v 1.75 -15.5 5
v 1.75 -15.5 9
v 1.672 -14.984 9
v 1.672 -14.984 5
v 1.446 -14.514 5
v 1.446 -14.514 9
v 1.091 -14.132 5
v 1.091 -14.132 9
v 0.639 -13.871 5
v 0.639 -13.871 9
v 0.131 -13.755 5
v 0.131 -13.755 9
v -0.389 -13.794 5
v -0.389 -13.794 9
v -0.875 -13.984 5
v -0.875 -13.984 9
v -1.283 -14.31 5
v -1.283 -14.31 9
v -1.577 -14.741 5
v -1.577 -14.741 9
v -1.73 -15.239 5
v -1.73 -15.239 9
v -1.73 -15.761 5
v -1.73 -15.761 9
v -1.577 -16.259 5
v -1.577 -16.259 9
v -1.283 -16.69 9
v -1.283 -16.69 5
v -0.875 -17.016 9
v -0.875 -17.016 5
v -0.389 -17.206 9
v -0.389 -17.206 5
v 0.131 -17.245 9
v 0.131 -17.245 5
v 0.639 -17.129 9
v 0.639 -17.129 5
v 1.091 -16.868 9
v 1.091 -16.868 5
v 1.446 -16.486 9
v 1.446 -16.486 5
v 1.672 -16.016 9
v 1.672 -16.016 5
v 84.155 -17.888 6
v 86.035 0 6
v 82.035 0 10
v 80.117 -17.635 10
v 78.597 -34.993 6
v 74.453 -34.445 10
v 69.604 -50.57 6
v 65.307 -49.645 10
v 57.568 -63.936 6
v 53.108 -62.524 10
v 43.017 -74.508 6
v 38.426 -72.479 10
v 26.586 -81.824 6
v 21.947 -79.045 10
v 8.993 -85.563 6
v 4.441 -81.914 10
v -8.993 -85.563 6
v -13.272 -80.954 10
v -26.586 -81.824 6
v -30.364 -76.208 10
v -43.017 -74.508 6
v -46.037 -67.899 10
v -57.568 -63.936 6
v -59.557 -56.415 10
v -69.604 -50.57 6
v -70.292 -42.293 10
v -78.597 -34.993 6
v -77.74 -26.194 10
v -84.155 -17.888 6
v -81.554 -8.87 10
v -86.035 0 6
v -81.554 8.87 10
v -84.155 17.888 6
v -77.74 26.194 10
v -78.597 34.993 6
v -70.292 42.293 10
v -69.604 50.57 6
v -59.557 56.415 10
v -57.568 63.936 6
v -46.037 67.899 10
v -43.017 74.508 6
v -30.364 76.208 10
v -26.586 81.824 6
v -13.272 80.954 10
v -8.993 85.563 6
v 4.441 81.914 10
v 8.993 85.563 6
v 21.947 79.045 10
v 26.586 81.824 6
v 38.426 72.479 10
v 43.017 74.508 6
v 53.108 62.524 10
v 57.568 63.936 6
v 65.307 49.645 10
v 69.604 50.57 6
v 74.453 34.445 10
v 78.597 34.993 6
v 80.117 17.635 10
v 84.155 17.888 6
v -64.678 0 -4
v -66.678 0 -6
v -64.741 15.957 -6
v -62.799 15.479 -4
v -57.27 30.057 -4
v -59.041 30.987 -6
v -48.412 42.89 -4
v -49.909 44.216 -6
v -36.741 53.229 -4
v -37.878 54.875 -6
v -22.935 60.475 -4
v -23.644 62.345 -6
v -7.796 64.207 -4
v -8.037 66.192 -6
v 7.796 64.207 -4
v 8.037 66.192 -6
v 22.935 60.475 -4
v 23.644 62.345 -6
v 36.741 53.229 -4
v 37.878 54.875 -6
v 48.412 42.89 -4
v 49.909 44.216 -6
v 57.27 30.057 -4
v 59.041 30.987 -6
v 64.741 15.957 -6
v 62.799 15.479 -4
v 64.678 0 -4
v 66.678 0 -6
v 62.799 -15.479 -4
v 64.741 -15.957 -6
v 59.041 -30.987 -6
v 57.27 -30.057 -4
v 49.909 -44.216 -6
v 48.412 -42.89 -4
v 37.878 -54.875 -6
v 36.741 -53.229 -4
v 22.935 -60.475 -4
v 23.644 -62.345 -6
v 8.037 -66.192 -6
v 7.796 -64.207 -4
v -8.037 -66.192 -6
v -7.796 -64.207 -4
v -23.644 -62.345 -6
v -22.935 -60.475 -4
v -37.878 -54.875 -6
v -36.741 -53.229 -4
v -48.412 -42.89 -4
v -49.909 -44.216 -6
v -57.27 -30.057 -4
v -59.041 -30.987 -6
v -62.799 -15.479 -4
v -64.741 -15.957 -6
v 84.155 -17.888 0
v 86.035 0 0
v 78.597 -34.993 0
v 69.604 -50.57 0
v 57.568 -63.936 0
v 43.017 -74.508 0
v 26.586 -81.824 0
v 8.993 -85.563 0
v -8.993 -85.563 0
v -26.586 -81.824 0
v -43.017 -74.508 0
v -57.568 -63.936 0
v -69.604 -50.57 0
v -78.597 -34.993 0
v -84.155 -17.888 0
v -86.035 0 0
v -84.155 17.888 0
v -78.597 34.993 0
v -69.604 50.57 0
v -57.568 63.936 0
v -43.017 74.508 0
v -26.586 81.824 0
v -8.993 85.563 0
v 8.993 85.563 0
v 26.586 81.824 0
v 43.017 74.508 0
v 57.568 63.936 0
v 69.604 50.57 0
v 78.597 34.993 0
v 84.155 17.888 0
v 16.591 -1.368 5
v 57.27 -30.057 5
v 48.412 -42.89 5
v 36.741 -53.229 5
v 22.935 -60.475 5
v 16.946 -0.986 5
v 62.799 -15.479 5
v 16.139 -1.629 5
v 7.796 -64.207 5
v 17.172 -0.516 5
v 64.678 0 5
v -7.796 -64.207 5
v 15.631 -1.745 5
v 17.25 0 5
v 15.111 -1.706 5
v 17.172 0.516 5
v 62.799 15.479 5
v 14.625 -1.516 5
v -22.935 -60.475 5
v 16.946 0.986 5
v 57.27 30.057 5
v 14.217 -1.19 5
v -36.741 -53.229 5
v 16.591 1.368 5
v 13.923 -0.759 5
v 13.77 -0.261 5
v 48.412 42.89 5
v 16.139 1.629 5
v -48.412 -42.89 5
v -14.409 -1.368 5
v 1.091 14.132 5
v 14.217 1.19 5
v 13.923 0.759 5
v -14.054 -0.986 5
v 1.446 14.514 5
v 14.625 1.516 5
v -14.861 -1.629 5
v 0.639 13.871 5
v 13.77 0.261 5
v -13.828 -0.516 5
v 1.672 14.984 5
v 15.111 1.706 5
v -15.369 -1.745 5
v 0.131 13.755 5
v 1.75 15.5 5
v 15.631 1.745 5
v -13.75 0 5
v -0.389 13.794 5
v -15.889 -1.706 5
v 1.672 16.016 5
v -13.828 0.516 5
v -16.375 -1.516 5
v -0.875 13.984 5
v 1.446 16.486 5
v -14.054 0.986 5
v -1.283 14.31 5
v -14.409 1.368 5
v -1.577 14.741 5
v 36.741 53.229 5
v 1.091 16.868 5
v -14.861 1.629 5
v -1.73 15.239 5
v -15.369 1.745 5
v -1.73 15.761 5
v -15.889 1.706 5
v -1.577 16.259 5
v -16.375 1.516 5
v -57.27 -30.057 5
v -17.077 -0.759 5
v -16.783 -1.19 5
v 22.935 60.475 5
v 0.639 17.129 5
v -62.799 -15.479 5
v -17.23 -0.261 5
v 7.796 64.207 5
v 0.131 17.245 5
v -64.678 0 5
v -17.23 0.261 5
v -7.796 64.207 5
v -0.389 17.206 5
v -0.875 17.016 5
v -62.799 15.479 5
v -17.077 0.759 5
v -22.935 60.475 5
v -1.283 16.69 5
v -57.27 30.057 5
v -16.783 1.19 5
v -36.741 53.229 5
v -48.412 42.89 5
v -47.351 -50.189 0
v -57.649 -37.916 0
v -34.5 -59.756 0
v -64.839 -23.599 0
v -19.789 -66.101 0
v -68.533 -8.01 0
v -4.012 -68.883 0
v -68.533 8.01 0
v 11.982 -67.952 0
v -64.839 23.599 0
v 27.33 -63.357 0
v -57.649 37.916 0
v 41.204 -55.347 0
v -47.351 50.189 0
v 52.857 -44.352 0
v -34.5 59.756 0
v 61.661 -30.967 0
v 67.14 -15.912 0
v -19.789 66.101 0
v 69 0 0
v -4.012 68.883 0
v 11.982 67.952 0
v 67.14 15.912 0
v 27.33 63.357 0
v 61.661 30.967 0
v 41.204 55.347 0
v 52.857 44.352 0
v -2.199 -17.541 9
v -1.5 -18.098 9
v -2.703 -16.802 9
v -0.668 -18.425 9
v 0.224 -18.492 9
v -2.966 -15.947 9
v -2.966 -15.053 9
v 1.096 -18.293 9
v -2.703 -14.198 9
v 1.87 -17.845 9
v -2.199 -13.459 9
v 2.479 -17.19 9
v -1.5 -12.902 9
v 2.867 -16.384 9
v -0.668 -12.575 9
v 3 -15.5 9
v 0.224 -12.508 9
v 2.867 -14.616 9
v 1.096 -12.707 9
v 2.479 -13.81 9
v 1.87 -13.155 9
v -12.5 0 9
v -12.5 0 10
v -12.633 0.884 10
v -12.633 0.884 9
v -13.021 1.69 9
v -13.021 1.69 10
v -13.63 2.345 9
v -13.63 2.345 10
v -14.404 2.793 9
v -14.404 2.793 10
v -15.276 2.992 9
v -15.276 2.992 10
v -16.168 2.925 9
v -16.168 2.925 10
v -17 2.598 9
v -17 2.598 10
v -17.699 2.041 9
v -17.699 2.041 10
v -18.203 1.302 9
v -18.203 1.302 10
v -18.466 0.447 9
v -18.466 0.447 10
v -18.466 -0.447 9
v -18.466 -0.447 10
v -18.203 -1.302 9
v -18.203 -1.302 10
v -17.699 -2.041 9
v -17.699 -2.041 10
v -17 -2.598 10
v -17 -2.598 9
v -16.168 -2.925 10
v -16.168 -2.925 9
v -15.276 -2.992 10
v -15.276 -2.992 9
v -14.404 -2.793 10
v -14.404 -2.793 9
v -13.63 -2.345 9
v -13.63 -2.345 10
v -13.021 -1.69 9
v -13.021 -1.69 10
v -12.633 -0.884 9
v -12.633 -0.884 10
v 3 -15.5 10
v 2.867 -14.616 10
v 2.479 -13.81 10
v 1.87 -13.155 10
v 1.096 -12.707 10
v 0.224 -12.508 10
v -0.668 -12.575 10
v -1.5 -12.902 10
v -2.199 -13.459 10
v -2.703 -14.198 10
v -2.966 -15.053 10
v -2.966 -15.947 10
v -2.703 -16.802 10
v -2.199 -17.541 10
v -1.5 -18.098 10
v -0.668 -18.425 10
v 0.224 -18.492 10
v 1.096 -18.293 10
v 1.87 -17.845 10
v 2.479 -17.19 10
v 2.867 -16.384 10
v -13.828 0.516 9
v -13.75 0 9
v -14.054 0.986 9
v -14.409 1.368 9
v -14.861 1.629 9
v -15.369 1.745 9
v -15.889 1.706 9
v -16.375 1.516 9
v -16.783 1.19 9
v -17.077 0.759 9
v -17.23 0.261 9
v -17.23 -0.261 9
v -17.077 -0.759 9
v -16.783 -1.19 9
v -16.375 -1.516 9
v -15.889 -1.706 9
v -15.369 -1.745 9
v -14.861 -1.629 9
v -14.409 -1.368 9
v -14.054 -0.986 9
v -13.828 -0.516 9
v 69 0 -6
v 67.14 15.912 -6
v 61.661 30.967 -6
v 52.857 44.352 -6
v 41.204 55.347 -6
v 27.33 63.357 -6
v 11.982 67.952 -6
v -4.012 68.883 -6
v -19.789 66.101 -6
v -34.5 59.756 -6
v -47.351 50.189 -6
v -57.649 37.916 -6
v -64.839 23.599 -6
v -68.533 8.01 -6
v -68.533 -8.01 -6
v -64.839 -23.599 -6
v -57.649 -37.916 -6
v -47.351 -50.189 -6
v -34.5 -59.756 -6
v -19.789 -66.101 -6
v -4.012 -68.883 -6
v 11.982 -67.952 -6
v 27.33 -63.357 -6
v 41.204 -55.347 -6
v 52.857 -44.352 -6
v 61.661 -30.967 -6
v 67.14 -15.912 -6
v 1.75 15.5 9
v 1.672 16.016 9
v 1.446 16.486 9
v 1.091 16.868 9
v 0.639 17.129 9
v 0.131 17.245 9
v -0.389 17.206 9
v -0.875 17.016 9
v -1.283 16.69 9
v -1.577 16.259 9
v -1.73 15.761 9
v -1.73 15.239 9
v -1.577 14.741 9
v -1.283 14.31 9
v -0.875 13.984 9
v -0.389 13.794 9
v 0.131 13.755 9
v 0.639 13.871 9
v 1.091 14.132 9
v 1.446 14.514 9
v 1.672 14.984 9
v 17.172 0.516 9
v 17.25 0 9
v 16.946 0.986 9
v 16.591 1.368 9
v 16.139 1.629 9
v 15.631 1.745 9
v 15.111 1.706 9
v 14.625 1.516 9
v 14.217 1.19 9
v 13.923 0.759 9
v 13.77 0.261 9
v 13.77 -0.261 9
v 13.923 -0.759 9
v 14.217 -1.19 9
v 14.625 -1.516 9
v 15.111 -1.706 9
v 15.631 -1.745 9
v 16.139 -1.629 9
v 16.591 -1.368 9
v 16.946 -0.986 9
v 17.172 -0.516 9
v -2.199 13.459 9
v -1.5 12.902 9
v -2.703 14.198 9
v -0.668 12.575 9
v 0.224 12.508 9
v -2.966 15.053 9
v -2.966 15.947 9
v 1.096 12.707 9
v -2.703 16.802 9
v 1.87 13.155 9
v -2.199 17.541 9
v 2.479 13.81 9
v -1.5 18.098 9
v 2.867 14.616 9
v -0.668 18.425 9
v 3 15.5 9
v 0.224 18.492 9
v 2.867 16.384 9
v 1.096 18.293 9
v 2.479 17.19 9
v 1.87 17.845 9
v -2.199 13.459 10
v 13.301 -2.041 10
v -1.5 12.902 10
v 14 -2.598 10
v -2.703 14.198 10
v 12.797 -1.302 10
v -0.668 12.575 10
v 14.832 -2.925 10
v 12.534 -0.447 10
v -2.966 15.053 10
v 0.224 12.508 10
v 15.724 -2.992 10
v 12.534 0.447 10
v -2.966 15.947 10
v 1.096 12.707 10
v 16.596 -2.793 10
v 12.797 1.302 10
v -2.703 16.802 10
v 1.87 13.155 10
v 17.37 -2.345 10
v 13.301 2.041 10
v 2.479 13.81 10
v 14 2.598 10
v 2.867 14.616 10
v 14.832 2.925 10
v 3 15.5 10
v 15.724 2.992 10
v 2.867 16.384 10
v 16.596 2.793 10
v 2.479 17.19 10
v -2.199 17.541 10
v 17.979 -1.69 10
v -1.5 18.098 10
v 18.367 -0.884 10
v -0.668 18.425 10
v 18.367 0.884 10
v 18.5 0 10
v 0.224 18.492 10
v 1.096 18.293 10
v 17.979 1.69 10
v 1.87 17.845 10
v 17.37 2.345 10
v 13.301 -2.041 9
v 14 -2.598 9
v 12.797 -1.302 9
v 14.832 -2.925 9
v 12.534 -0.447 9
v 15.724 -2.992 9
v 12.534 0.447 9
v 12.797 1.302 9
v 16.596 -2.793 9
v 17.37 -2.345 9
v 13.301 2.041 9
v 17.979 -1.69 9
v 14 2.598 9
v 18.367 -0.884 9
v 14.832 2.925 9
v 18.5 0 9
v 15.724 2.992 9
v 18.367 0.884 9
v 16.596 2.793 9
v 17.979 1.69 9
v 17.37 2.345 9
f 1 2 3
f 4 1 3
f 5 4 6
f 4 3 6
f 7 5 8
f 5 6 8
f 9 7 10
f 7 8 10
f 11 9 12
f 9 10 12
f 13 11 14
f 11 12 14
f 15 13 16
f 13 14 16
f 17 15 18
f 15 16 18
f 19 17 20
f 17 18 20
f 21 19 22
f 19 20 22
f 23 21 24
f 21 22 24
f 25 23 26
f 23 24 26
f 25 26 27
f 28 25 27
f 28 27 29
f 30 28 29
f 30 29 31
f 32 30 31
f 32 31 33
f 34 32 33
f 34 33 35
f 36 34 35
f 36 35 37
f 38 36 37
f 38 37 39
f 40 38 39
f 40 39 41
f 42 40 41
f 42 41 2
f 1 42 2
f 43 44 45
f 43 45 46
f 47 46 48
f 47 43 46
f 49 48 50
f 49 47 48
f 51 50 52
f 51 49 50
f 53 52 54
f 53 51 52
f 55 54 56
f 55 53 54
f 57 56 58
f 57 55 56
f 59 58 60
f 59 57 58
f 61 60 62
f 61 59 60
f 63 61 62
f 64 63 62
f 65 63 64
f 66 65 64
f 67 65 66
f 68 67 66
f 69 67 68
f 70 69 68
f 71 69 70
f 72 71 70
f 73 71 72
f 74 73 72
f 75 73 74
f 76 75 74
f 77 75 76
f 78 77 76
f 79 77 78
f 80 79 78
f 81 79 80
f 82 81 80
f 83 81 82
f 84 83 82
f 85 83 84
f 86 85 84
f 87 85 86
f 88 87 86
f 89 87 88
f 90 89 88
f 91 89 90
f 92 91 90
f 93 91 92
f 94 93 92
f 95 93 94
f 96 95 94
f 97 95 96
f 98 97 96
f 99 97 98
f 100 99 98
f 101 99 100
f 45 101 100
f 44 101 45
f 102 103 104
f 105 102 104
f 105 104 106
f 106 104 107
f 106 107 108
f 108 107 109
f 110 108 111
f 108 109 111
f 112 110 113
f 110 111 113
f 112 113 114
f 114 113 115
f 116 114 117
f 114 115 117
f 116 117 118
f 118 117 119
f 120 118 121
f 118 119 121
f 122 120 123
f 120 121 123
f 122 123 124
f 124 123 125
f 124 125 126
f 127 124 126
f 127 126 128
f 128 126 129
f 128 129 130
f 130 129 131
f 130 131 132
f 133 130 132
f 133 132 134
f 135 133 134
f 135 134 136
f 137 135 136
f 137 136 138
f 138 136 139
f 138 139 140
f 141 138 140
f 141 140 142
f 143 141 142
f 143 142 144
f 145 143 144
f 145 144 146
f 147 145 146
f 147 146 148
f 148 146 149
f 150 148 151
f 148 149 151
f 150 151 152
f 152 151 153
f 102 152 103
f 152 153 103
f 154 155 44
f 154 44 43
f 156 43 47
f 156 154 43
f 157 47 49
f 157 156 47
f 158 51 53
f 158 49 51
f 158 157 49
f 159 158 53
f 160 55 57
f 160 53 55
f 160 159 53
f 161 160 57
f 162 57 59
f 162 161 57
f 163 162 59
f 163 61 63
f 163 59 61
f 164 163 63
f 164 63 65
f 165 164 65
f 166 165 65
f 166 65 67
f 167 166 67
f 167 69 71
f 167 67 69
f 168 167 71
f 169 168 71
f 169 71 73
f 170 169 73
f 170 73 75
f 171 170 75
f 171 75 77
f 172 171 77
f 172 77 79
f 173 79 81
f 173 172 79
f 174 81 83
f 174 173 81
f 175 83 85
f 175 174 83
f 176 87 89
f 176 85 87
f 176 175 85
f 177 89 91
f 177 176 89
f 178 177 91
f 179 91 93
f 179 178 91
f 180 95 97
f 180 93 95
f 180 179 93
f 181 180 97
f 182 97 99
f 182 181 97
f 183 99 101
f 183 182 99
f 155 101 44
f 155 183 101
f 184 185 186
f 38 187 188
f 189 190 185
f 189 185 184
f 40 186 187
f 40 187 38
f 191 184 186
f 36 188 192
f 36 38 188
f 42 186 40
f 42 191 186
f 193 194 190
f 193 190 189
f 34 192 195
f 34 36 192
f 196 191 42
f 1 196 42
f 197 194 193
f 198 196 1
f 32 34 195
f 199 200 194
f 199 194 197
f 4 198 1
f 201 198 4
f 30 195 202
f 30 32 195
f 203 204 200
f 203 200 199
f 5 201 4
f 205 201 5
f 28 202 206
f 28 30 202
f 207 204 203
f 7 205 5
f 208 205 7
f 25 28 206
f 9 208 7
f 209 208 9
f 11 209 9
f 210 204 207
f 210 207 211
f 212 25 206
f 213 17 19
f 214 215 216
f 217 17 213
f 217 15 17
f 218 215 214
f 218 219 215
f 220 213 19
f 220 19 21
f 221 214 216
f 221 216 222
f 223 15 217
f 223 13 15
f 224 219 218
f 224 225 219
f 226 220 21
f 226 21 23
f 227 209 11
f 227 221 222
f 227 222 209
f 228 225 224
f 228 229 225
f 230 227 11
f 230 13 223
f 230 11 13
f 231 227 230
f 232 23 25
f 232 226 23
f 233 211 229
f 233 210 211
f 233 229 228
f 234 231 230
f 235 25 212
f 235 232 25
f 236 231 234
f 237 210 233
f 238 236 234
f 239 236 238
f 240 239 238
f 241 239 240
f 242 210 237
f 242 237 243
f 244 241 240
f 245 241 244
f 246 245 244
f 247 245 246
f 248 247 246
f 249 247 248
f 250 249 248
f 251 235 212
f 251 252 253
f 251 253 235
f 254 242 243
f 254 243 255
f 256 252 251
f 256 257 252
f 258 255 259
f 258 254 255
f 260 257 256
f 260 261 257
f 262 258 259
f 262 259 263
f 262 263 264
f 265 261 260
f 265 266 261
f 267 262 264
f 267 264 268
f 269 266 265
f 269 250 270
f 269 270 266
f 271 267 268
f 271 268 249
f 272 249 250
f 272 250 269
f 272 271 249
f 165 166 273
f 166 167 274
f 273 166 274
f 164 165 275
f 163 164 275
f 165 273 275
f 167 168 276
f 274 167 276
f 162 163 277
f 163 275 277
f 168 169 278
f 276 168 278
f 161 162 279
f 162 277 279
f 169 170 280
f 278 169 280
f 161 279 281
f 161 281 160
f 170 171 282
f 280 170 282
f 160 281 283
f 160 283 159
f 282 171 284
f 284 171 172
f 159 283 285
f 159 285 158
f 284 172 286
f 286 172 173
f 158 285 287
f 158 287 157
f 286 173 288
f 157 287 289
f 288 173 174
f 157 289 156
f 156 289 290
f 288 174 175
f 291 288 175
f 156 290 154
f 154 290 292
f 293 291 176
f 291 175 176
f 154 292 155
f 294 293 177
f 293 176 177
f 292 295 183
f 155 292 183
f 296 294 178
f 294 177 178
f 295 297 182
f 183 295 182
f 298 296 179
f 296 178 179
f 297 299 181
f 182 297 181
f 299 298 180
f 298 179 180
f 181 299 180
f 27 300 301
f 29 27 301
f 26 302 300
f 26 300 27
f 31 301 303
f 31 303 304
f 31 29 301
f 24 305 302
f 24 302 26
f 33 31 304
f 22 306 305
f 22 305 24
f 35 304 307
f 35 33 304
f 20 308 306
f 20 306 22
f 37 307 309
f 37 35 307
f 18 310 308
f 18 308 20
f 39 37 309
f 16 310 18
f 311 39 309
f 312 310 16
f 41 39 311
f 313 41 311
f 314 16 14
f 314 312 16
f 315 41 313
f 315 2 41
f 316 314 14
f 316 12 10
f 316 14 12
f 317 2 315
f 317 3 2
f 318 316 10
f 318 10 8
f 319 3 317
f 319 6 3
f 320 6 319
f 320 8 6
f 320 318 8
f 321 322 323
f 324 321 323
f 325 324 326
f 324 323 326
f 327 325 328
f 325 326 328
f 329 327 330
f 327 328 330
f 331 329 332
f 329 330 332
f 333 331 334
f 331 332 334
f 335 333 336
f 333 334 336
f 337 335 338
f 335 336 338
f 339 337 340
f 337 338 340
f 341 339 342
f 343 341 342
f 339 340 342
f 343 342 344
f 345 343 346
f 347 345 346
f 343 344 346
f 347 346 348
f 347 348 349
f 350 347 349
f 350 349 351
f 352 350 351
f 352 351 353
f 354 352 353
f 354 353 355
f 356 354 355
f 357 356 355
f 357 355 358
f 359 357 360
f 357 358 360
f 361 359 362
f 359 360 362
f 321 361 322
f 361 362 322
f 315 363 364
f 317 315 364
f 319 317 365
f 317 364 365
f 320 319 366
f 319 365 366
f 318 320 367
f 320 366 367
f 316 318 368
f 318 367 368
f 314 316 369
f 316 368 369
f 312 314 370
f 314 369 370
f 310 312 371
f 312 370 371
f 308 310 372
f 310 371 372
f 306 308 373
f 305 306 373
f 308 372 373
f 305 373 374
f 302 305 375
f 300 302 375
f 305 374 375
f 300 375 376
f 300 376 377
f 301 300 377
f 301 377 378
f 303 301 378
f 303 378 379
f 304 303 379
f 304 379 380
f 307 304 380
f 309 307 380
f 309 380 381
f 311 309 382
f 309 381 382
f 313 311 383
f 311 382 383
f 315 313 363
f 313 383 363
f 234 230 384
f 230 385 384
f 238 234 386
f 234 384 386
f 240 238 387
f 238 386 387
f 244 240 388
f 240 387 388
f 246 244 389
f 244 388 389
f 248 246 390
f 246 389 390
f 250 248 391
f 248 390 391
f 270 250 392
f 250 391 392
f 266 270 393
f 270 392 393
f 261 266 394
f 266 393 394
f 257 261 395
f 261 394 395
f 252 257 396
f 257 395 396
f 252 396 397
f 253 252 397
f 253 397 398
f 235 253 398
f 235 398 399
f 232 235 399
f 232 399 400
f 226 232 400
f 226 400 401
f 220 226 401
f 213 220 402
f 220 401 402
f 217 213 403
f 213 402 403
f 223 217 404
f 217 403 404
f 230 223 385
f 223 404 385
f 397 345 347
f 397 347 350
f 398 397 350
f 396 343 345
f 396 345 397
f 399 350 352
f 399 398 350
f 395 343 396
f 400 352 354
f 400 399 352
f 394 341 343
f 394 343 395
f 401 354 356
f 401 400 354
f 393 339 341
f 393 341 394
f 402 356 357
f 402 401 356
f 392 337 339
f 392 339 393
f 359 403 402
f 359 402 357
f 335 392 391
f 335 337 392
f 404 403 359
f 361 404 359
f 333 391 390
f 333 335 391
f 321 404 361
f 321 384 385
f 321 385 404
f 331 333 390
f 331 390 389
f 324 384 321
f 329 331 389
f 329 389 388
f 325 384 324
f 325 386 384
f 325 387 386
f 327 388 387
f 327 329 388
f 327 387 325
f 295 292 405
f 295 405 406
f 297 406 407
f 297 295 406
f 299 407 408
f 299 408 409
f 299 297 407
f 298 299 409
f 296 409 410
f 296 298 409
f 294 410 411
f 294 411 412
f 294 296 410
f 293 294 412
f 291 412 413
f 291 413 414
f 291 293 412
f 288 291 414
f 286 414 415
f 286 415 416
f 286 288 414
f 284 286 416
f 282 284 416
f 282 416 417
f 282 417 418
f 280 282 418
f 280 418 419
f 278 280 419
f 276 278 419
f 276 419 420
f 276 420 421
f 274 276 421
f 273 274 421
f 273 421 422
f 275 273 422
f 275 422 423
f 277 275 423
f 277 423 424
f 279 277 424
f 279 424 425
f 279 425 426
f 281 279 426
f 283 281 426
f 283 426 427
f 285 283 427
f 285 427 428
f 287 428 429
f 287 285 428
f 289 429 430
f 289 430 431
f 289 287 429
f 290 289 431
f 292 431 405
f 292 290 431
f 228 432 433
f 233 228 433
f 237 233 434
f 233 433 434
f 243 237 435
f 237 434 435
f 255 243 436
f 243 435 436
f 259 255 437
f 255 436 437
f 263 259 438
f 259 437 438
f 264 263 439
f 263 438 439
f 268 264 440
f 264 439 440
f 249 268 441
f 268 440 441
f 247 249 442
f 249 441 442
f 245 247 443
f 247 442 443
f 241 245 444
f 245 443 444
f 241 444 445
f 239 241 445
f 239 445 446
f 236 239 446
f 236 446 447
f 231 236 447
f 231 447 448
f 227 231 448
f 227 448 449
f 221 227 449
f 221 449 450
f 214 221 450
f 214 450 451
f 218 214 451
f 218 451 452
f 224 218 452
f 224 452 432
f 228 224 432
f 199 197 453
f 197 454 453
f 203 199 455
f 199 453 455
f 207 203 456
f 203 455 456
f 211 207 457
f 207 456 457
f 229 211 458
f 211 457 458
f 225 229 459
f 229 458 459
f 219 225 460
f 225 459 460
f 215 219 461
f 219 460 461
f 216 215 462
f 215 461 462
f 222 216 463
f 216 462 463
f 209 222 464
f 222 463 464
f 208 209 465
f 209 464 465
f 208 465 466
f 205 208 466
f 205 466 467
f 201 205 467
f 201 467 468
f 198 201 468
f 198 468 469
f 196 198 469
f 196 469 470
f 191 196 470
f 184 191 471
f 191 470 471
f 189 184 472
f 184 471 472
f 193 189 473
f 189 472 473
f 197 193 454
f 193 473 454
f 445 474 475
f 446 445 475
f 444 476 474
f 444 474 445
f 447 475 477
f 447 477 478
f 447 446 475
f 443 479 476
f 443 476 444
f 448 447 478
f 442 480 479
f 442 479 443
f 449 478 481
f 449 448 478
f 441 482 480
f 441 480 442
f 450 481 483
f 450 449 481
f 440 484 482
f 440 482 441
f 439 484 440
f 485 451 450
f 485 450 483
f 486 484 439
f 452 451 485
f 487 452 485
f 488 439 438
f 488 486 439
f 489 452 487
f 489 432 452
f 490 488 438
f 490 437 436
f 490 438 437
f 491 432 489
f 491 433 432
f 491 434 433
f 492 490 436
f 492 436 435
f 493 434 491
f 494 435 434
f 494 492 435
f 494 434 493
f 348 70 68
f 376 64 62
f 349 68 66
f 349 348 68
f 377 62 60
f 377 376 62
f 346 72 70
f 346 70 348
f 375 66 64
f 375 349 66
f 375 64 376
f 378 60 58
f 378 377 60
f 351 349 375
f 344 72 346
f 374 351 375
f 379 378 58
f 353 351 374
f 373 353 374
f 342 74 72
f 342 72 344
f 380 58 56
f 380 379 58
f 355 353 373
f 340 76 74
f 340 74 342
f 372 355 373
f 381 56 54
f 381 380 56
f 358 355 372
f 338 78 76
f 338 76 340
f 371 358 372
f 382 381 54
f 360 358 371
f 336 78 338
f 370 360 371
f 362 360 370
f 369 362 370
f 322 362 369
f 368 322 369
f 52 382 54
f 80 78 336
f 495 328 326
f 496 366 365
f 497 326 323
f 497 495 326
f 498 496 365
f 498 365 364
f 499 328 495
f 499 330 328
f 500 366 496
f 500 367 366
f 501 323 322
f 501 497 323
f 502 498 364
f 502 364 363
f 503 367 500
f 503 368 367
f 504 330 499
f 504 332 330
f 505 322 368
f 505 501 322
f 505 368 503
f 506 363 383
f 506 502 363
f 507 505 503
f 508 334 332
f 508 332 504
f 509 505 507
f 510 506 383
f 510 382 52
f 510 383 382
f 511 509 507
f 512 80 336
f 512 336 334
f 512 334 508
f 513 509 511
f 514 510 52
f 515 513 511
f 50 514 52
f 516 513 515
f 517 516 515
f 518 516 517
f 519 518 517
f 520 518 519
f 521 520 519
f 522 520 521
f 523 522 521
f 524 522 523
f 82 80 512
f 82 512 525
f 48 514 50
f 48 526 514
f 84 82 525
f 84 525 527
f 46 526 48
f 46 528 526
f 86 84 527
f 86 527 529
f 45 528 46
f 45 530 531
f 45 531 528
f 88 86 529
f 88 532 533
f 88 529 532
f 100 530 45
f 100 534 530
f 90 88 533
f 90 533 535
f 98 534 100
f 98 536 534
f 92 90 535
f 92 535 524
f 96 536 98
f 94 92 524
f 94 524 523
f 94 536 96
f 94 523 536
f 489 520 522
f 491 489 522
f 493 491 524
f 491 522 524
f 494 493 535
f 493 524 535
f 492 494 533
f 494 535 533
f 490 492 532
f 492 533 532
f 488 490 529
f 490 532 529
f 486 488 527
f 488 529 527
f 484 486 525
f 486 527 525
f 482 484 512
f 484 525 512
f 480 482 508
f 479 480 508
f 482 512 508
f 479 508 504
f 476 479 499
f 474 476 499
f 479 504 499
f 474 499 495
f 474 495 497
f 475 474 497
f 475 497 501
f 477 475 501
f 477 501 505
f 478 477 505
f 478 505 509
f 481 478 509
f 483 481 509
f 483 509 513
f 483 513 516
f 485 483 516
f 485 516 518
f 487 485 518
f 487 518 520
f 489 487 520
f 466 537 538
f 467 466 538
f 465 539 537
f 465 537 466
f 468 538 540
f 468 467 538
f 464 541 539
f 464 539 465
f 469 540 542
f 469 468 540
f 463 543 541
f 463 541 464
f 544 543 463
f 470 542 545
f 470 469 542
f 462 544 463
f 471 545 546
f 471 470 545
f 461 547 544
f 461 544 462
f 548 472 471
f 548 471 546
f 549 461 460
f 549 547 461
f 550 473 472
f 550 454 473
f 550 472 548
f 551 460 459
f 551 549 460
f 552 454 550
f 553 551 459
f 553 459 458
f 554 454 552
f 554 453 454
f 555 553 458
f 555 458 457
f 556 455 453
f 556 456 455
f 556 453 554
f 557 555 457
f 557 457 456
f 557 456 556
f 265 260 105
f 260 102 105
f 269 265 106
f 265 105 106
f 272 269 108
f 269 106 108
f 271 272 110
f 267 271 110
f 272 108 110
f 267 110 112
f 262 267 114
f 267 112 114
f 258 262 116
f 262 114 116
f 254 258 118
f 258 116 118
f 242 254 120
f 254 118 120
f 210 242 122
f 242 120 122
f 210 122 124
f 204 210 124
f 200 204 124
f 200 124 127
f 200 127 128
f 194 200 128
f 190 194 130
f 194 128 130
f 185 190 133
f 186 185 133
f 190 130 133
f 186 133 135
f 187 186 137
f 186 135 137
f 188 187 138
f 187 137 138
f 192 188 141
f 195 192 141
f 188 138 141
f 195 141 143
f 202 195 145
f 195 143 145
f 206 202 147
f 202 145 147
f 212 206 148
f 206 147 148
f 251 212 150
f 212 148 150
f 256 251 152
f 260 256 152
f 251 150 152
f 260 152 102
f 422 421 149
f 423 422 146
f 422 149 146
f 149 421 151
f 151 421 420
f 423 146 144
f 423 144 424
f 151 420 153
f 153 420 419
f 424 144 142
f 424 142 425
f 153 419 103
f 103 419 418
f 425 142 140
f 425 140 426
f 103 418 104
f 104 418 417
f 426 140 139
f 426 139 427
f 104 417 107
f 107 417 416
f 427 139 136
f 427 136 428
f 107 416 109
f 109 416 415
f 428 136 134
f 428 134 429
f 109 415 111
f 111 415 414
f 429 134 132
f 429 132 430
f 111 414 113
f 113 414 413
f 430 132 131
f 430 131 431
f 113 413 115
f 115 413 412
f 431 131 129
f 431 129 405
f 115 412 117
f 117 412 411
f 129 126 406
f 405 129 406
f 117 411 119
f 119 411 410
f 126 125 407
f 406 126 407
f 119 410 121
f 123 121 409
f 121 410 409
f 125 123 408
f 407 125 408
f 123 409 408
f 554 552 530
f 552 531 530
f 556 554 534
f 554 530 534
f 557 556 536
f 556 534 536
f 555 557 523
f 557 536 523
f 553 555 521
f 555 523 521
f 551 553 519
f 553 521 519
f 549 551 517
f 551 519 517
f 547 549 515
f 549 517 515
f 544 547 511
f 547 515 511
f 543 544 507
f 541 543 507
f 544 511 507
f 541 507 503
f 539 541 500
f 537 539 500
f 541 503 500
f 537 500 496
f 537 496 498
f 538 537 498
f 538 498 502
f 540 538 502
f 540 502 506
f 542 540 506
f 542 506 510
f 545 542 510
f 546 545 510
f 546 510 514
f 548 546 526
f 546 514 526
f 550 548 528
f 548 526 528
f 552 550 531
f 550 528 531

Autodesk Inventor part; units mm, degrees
ref_plane "YZ Plane" through (0, 0, 0) normal (1, 0, 0) x (0, 1, 0)
ref_plane "XZ Plane" through (0, 0, 0) normal (0, 1, 0) x (-1, 0, 0)
ref_plane "XY Plane" through (0, 0, 0) normal (0, 0, 1) x (1, 0, 0)
sketch "Sketch1" plane through (0, 0, 0) normal (0, 0, 1) x (1, 0, 0)
  circle A0 centre (0, 0) radius 69
  dimension "d0" = 138
extrude "Extrusion1" add sketch "Sketch1" against normal blind 6
sketch "Sketch2" plane through (0, 0, 0) normal (0, 0, 1) x (1, 0, 0)
  circle A0 centre (0, 0) radius 86.0347
extrude "Extrusion2" add sketch "Sketch2" along normal blind 10
sketch "Sketch3" plane through (0, 0, 10) normal (0, 0, 1) x (1, 0, 0)
  circle A0 centre (0, 0) radius 86.0347 projected
  circle A1 centre (0, 0) radius 15.5 construction
  circle A2 centre (0, 15.5) radius 1.75
  circle A3 centre (-15.5, 0) radius 1.75
  circle A4 centre (0, -15.5) radius 1.75
  circle A5 centre (15.5, 0) radius 1.75
  dimension "d5" = 31
  dimension "d6" = 3.5
  dimension "d9" = 360
extrude "Extrusion3" cut sketch "Sketch3" against normal through all contours A2 | A3 | A4 | A5
sketch "Sketch4" plane through (0, 0, 10) normal (0, 0, 1) x (1, 0, 0)
  circle A0 centre (15.5, 0) radius 1.75 projected
  circle A1 centre (-15.5, 0) radius 1.75 projected
  circle A2 centre (0, -15.5) radius 1.75 projected
  circle A3 centre (0, 15.5) radius 1.75 projected
  circle A4 centre (0, 0) radius 86.0347 projected
  circle A5 centre (0, -15.5) radius 3
  circle A6 centre (15.5, 0) radius 3
  circle A7 centre (0, 15.5) radius 3
  circle A8 centre (-15.5, 0) radius 3
  dimension "d13" = 6
  dimension "d16" = 360
extrude "Extrusion4" cut sketch "Sketch4" against normal blind 1 contours A0 | A1 | A3 | A5 | A6 | A7 | A8
sketch "Sketch5" plane through (0, 0, 0) normal (1, 0, 0) x (0, 1, 0)
  line L0 (86.0347, 10) -> (-86.0347, 10) projected
  line L1 (-86.0347, 0) -> (-86.0347, 10) projected
  line L2 (0, 0) -> (0, 58.0565)
  line L3 (-22.0852, 10) -> (-23.5623, 10) construction
  line L4 (-23.5623, 10) -> (-67.5613, 8.2465) construction
  line L5 (-67.5613, 8.2465) -> (-86.0347, 1.135) construction
  spline S0 degree 3 poles (-22.0852, 10) (-23.5623, 10) (-67.5613, 8.2465) (-86.0347, 1.135) knots 1 1 1 1 2 2 2 2
revolve "Revolution1" [suppressed]
sketch "Sketch6" plane through (0, 0, -6) normal (0, 0, -1) x (-1, 0, 0)
  circle A0 centre (-15.5, 0) radius 1.75 projected
  circle A1 centre (15.5, 0) radius 1.75 projected
  circle A2 centre (0, -15.5) radius 1.75 projected
  circle A3 centre (0, 15.5) radius 1.75 projected
  circle A4 centre (0, 0) radius 69 projected
  circle A5 centre (0, 0) radius 64.6782
extrude "Extrusion5" cut sketch "Sketch6" against normal blind 8 contours A5
chamfer "Chamfer1" distance 4 angle 45 1 edges at (-86.0347, 0, 10)
chamfer "Chamfer2" distance 2 angle 45 1 edges at (64.6782, 0, -6)
sketch "Sketch7" plane through (0, 0, 2) normal (0, 0, -1) x (-1, 0, 0)
  circle A0 centre (0, 0) radius 64.6782 projected
  circle A1 centre (0, 15.5) radius 1.75 projected
  circle A2 centre (0, -15.5) radius 1.75 projected
  circle A3 centre (15.5, 0) radius 1.75 projected
  circle A4 centre (-15.5, 0) radius 1.75 projected
extrude "Extrusion6" cut sketch "Sketch7" against normal blind 3
properties part number "hoverboardHubCap" material "ABS Plastic"
